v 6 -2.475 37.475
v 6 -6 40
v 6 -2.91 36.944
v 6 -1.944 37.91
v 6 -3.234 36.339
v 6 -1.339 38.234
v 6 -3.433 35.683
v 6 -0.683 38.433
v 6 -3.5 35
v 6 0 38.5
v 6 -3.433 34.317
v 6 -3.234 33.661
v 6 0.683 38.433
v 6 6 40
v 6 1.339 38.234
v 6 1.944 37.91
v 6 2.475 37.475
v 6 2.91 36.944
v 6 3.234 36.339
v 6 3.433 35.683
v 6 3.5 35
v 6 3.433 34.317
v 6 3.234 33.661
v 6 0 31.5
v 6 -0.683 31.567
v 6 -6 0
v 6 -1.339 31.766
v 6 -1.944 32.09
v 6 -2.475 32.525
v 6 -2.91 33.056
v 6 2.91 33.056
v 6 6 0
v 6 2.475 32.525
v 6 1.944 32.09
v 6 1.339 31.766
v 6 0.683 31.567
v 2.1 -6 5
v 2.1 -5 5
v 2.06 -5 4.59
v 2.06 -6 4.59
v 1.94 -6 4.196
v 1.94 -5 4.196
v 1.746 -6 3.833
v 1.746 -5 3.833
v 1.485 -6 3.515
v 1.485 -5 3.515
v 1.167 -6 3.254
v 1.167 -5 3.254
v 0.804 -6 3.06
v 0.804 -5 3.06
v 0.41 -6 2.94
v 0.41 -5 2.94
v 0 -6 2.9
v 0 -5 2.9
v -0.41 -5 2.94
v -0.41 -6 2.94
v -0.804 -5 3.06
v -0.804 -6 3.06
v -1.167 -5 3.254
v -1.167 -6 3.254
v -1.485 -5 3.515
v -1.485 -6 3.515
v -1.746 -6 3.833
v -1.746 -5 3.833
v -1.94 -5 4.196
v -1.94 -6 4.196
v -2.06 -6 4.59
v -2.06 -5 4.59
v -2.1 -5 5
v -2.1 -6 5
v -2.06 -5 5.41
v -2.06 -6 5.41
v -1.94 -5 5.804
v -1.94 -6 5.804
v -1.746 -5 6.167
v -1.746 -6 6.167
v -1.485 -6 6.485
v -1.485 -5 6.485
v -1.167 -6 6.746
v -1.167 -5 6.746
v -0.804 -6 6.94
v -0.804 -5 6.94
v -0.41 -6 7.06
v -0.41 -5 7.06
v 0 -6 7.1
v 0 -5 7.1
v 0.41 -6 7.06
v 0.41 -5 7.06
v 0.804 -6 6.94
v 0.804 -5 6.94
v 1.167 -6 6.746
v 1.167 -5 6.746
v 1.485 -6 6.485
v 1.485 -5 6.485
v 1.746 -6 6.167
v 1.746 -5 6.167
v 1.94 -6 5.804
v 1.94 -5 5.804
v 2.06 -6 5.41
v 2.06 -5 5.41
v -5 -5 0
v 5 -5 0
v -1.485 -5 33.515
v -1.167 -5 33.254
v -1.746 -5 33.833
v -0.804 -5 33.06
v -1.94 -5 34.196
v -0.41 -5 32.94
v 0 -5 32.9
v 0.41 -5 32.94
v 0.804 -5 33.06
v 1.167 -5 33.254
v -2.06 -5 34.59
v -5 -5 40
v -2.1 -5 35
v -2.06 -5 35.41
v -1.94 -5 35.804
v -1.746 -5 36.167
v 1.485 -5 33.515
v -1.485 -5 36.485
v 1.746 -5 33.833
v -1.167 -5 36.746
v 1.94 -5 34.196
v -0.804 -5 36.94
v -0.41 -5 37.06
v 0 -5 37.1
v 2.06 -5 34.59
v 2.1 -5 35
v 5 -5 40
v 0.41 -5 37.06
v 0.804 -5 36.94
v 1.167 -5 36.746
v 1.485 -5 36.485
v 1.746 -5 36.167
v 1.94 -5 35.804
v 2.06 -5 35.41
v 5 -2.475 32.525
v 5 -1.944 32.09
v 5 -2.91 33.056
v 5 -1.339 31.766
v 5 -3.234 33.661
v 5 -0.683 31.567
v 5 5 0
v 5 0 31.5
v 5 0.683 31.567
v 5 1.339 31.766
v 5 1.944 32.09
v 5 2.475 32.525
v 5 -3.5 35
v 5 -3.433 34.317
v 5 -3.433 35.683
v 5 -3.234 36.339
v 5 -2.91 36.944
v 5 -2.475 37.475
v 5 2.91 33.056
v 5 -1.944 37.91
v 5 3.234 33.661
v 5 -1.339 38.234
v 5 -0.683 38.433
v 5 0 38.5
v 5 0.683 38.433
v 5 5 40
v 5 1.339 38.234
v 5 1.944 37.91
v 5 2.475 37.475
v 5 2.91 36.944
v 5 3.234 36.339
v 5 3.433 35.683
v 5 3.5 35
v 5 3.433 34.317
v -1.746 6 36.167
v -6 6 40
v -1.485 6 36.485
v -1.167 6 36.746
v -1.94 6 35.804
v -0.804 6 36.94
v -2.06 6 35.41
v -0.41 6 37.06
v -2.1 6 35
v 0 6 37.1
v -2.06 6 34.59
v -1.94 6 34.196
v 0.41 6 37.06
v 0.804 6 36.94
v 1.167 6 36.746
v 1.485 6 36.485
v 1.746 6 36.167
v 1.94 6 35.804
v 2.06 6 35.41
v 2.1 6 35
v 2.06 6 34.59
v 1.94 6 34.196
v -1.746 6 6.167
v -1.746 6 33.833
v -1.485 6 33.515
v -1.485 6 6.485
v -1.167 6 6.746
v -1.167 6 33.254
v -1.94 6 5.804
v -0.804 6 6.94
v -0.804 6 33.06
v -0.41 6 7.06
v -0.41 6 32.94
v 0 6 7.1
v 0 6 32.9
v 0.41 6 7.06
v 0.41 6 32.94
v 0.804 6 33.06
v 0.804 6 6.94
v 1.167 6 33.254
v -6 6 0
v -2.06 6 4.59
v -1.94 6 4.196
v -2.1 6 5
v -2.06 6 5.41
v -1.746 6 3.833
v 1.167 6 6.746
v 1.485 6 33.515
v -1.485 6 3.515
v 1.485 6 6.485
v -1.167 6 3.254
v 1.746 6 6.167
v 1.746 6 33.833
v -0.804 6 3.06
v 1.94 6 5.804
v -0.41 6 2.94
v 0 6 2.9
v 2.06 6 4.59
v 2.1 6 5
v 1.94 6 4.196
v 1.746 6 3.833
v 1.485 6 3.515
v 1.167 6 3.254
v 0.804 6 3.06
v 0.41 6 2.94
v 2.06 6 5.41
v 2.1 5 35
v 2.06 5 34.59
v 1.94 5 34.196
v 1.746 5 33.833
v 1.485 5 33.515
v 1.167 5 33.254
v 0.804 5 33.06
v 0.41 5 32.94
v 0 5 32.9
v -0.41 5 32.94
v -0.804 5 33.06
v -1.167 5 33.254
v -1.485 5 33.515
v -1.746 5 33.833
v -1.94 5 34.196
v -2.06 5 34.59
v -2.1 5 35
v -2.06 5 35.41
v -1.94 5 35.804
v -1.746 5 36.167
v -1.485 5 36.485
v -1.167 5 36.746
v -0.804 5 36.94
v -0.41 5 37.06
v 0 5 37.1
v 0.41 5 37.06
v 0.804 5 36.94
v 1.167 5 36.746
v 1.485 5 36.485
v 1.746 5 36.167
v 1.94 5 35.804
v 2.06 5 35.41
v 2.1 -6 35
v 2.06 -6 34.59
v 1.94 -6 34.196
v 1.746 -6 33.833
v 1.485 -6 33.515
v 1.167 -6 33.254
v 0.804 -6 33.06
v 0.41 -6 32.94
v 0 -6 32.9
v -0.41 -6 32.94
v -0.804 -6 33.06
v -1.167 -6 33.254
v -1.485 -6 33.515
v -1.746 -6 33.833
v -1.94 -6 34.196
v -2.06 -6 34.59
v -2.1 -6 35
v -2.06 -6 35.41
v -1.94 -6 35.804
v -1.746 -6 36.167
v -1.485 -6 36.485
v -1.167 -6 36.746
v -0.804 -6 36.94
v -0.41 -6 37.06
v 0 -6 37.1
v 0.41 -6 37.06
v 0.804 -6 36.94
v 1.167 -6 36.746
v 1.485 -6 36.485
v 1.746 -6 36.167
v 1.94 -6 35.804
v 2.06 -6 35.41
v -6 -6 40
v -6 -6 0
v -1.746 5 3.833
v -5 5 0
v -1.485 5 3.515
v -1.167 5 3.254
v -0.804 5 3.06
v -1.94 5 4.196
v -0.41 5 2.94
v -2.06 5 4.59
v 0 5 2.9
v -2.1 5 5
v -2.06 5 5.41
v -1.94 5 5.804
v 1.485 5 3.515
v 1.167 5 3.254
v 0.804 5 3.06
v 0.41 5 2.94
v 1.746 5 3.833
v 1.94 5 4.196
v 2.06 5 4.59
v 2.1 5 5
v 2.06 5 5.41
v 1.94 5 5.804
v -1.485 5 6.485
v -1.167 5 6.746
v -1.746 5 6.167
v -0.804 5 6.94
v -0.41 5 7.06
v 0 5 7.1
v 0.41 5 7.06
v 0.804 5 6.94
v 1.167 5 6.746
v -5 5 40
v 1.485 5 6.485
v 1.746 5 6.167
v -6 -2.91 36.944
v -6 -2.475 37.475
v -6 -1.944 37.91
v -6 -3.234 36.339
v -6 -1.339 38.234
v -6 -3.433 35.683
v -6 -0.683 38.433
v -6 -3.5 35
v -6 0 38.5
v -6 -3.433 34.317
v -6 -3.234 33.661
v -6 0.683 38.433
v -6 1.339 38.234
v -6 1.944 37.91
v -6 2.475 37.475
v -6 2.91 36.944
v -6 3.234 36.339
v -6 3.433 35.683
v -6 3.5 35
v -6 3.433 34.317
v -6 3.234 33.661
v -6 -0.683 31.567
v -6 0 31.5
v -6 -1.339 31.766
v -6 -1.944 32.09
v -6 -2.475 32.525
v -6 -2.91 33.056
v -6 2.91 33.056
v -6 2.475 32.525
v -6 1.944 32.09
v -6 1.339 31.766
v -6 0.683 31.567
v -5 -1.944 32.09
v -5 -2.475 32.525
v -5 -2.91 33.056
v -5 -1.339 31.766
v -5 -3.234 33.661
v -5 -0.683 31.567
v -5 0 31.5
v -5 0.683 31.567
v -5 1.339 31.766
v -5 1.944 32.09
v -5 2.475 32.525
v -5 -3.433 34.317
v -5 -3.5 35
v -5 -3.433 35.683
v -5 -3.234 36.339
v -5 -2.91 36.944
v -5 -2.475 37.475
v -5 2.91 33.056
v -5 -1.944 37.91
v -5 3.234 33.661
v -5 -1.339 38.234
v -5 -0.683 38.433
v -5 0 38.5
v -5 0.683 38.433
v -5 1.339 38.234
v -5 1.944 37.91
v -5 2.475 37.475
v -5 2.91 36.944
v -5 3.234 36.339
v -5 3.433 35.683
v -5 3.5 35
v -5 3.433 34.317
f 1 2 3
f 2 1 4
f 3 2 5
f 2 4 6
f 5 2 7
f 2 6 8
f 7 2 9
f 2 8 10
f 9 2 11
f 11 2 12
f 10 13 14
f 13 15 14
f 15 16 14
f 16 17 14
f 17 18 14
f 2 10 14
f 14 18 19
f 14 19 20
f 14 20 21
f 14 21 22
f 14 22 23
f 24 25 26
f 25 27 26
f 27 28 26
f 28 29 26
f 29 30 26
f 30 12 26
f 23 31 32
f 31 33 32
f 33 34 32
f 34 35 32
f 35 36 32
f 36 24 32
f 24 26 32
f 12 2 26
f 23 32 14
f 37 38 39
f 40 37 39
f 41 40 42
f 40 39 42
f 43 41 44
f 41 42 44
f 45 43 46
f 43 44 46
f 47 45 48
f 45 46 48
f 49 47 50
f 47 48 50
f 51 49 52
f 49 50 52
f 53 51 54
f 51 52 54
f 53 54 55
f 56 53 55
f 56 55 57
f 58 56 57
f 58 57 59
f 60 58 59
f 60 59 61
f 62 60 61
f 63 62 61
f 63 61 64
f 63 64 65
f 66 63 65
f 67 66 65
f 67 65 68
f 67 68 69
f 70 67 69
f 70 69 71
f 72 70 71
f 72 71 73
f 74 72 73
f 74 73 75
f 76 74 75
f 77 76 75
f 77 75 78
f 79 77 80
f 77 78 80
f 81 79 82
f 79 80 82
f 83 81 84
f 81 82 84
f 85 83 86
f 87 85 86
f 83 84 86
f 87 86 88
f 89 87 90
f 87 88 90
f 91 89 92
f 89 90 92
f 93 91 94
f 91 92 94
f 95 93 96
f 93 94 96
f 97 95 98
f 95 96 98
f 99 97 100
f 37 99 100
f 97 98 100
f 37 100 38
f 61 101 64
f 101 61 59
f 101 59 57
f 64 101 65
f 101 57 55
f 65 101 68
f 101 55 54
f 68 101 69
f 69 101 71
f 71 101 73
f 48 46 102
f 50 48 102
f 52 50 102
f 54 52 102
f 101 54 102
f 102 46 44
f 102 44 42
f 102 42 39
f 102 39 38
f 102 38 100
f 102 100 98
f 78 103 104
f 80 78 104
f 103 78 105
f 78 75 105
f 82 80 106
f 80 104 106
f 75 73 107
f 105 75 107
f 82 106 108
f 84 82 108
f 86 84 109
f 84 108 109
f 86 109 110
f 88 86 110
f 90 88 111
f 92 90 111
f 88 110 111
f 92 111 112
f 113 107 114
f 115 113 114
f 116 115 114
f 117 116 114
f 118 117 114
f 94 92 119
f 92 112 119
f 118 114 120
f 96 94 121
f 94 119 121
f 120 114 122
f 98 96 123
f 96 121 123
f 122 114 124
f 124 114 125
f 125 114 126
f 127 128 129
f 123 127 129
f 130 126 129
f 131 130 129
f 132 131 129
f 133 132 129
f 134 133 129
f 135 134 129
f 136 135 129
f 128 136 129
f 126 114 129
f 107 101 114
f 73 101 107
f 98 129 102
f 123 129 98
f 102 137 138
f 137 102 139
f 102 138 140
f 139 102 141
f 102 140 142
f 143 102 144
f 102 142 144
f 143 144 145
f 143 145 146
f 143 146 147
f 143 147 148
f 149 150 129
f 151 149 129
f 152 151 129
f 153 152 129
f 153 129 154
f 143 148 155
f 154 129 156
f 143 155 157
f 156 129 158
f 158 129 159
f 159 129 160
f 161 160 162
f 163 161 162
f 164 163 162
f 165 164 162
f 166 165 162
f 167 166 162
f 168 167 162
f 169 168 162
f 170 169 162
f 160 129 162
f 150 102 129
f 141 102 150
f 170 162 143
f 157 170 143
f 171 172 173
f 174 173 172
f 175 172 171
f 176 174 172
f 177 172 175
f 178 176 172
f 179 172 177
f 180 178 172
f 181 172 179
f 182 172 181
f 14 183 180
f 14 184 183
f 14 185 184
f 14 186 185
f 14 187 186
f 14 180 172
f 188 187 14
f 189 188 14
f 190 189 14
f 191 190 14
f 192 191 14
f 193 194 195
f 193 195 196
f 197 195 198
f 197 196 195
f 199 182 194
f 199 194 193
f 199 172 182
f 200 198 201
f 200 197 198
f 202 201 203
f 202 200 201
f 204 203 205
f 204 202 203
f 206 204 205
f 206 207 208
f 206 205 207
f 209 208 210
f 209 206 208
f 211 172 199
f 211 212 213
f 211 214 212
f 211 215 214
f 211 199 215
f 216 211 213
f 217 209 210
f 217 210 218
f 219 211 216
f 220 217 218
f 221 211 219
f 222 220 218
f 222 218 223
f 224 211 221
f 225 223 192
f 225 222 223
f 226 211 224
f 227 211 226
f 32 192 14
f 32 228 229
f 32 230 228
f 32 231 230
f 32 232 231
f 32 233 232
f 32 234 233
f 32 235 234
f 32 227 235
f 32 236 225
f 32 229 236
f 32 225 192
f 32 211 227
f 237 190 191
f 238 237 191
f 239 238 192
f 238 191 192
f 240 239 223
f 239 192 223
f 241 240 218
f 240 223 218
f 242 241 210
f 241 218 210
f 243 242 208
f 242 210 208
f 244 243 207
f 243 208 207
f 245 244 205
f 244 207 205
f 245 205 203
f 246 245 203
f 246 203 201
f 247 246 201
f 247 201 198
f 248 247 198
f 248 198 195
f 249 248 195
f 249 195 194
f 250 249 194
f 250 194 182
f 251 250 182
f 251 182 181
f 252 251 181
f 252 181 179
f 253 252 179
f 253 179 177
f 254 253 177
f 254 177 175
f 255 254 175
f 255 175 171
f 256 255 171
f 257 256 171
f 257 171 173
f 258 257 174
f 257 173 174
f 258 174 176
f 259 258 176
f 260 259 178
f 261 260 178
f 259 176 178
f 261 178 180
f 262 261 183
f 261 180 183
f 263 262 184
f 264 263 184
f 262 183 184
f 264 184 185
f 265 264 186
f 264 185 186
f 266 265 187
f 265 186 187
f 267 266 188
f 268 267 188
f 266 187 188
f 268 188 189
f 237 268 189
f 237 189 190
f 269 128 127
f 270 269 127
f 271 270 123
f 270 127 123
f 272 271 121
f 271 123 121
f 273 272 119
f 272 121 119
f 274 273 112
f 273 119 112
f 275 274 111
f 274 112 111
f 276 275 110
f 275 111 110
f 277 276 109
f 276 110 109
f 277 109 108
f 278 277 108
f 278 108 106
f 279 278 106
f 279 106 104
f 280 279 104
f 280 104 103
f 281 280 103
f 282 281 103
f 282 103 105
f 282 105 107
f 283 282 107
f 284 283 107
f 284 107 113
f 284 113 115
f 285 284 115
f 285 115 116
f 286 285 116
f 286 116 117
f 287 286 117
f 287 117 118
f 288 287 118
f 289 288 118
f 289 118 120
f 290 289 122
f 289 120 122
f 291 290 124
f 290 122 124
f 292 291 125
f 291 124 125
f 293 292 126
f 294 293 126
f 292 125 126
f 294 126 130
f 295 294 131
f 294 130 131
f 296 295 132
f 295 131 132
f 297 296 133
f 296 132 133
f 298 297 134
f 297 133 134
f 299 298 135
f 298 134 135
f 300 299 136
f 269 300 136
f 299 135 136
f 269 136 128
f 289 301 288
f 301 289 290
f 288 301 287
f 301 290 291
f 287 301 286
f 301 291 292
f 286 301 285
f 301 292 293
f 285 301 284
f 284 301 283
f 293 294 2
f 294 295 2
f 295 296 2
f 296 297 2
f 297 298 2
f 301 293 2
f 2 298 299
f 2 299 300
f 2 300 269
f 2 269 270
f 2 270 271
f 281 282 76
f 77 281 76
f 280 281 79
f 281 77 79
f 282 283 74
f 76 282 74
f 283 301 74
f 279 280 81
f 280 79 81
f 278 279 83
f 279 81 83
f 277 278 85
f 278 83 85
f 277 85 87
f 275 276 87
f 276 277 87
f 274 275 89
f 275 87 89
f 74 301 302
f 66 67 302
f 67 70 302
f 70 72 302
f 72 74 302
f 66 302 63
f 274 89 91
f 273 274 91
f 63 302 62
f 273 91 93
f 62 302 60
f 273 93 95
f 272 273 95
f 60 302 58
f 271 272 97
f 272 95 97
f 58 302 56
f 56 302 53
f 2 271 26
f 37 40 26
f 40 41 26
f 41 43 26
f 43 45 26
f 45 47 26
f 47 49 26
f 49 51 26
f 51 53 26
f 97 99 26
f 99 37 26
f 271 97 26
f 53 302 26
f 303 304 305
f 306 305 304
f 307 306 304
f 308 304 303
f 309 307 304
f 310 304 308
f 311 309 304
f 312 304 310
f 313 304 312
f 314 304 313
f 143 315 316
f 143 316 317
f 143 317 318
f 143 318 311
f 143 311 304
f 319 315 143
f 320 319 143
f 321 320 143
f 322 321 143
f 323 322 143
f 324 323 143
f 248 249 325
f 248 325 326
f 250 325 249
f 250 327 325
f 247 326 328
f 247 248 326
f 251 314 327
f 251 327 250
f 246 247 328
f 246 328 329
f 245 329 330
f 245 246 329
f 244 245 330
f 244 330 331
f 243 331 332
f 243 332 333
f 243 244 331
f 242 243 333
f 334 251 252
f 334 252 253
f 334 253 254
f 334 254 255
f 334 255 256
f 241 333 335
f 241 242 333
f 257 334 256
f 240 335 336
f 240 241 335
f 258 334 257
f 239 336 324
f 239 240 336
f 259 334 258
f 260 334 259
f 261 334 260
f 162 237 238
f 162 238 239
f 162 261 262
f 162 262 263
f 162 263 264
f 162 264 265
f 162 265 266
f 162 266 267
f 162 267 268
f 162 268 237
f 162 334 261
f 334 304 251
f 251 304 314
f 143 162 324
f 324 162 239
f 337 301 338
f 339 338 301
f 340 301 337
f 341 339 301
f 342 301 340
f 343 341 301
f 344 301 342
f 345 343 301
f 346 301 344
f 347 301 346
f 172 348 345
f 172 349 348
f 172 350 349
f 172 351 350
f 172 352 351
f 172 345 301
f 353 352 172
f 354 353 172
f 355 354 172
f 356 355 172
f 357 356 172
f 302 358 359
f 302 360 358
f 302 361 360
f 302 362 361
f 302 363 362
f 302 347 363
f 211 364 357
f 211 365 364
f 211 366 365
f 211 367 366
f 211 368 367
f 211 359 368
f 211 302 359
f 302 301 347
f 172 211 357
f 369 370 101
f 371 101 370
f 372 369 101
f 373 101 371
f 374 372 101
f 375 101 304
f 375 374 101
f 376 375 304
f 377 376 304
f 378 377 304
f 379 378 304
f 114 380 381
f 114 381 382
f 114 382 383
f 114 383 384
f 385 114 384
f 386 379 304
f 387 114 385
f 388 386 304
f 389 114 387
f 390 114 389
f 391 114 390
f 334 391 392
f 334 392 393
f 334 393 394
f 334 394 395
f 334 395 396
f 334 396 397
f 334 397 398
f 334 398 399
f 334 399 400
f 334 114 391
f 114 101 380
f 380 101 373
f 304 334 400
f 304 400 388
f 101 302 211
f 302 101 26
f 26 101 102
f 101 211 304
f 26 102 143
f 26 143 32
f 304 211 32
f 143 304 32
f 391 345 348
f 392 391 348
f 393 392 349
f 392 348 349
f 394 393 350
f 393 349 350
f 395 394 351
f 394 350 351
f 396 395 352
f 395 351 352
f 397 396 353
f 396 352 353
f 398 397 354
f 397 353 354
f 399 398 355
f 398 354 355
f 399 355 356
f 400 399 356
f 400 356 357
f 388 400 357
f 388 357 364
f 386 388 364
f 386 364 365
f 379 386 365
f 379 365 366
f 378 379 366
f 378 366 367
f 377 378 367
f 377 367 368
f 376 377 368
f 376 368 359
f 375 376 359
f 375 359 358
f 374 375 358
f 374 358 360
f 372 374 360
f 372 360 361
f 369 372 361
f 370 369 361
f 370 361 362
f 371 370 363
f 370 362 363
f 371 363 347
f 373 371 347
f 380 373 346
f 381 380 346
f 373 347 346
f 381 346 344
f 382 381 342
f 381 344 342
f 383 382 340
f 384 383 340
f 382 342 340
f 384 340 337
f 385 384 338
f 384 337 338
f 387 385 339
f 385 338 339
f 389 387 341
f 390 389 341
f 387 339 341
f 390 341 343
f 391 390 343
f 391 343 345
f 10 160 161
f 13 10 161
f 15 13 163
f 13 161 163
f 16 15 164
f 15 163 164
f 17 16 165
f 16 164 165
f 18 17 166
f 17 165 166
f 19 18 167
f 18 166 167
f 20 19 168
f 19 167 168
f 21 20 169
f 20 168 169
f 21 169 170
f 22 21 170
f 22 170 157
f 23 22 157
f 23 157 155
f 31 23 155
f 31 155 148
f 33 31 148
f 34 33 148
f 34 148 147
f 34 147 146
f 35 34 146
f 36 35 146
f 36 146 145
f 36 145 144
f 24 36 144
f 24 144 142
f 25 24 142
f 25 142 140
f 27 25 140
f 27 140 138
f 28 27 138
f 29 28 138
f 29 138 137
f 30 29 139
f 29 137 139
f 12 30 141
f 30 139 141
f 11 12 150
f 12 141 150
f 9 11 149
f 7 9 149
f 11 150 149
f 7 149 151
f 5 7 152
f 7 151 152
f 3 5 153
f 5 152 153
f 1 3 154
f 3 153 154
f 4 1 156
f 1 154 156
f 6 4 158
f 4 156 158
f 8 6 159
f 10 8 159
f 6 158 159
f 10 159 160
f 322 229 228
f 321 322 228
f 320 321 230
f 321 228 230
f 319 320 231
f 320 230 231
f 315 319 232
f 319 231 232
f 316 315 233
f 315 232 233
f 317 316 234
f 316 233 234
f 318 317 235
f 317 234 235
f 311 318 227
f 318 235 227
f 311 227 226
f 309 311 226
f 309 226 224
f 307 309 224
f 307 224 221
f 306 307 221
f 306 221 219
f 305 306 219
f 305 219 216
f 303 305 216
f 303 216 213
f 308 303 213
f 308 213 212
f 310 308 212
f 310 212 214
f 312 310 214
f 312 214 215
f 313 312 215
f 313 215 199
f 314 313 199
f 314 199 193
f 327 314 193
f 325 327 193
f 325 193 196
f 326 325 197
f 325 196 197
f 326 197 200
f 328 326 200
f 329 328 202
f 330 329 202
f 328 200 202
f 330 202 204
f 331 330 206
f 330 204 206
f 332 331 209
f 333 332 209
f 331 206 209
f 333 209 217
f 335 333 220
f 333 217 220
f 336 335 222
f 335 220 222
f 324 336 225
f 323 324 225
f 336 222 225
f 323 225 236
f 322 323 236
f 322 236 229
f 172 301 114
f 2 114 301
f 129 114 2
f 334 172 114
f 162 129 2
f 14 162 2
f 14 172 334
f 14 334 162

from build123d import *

# Parameters (mm, degrees)
SKETCH_1_W          = 12
SKETCH_1_H          = 12
EXTRUDE_1_DEPTH     = 40
SKETCH_2_W          = 10
SKETCH_2_H          = 10
CUT_EXTRUDE_1_DEPTH = 47.5
SKETCH_3_R          = 2.1
CUT_EXTRUDE_2_DEPTH = 47.5
SKETCH_5_R          = 3.5
CUT_EXTRUDE_4_DEPTH = 47.5


with BuildPart() as part:
    # ｽｹｯﾁ1 → ﾎﾞｽ - 押し出し1 (new body)
    with BuildSketch(Plane.XY):
        Rectangle(SKETCH_1_W, SKETCH_1_H)
    extrude(amount=EXTRUDE_1_DEPTH)

    # ｽｹｯﾁ2 → ｶｯﾄ - 押し出し1 (cut)
    with BuildSketch(Plane.XY.offset(40)):
        Rectangle(SKETCH_2_W, SKETCH_2_H)
    extrude(amount=-CUT_EXTRUDE_1_DEPTH, mode=Mode.SUBTRACT)

    # ｽｹｯﾁ3 → ｶｯﾄ - 押し出し2 (cut)
    with BuildSketch(Plane(origin=(0, 6, 0), x_dir=(1, 0, 0), z_dir=(0, 1, 0))):
        with Locations((0, -5)):
            Circle(SKETCH_3_R)
        with Locations((0, -35)):
            Circle(SKETCH_3_R)
    extrude(amount=-CUT_EXTRUDE_2_DEPTH, mode=Mode.SUBTRACT)

    # ｽｹｯﾁ5 → ｶｯﾄ - 押し出し4 (cut)
    with BuildSketch(Plane.ZY.offset(6)):
        with Locations((35, 0)):
            Circle(SKETCH_5_R)
    extrude(amount=-CUT_EXTRUDE_4_DEPTH, mode=Mode.SUBTRACT)


solid = part.part
